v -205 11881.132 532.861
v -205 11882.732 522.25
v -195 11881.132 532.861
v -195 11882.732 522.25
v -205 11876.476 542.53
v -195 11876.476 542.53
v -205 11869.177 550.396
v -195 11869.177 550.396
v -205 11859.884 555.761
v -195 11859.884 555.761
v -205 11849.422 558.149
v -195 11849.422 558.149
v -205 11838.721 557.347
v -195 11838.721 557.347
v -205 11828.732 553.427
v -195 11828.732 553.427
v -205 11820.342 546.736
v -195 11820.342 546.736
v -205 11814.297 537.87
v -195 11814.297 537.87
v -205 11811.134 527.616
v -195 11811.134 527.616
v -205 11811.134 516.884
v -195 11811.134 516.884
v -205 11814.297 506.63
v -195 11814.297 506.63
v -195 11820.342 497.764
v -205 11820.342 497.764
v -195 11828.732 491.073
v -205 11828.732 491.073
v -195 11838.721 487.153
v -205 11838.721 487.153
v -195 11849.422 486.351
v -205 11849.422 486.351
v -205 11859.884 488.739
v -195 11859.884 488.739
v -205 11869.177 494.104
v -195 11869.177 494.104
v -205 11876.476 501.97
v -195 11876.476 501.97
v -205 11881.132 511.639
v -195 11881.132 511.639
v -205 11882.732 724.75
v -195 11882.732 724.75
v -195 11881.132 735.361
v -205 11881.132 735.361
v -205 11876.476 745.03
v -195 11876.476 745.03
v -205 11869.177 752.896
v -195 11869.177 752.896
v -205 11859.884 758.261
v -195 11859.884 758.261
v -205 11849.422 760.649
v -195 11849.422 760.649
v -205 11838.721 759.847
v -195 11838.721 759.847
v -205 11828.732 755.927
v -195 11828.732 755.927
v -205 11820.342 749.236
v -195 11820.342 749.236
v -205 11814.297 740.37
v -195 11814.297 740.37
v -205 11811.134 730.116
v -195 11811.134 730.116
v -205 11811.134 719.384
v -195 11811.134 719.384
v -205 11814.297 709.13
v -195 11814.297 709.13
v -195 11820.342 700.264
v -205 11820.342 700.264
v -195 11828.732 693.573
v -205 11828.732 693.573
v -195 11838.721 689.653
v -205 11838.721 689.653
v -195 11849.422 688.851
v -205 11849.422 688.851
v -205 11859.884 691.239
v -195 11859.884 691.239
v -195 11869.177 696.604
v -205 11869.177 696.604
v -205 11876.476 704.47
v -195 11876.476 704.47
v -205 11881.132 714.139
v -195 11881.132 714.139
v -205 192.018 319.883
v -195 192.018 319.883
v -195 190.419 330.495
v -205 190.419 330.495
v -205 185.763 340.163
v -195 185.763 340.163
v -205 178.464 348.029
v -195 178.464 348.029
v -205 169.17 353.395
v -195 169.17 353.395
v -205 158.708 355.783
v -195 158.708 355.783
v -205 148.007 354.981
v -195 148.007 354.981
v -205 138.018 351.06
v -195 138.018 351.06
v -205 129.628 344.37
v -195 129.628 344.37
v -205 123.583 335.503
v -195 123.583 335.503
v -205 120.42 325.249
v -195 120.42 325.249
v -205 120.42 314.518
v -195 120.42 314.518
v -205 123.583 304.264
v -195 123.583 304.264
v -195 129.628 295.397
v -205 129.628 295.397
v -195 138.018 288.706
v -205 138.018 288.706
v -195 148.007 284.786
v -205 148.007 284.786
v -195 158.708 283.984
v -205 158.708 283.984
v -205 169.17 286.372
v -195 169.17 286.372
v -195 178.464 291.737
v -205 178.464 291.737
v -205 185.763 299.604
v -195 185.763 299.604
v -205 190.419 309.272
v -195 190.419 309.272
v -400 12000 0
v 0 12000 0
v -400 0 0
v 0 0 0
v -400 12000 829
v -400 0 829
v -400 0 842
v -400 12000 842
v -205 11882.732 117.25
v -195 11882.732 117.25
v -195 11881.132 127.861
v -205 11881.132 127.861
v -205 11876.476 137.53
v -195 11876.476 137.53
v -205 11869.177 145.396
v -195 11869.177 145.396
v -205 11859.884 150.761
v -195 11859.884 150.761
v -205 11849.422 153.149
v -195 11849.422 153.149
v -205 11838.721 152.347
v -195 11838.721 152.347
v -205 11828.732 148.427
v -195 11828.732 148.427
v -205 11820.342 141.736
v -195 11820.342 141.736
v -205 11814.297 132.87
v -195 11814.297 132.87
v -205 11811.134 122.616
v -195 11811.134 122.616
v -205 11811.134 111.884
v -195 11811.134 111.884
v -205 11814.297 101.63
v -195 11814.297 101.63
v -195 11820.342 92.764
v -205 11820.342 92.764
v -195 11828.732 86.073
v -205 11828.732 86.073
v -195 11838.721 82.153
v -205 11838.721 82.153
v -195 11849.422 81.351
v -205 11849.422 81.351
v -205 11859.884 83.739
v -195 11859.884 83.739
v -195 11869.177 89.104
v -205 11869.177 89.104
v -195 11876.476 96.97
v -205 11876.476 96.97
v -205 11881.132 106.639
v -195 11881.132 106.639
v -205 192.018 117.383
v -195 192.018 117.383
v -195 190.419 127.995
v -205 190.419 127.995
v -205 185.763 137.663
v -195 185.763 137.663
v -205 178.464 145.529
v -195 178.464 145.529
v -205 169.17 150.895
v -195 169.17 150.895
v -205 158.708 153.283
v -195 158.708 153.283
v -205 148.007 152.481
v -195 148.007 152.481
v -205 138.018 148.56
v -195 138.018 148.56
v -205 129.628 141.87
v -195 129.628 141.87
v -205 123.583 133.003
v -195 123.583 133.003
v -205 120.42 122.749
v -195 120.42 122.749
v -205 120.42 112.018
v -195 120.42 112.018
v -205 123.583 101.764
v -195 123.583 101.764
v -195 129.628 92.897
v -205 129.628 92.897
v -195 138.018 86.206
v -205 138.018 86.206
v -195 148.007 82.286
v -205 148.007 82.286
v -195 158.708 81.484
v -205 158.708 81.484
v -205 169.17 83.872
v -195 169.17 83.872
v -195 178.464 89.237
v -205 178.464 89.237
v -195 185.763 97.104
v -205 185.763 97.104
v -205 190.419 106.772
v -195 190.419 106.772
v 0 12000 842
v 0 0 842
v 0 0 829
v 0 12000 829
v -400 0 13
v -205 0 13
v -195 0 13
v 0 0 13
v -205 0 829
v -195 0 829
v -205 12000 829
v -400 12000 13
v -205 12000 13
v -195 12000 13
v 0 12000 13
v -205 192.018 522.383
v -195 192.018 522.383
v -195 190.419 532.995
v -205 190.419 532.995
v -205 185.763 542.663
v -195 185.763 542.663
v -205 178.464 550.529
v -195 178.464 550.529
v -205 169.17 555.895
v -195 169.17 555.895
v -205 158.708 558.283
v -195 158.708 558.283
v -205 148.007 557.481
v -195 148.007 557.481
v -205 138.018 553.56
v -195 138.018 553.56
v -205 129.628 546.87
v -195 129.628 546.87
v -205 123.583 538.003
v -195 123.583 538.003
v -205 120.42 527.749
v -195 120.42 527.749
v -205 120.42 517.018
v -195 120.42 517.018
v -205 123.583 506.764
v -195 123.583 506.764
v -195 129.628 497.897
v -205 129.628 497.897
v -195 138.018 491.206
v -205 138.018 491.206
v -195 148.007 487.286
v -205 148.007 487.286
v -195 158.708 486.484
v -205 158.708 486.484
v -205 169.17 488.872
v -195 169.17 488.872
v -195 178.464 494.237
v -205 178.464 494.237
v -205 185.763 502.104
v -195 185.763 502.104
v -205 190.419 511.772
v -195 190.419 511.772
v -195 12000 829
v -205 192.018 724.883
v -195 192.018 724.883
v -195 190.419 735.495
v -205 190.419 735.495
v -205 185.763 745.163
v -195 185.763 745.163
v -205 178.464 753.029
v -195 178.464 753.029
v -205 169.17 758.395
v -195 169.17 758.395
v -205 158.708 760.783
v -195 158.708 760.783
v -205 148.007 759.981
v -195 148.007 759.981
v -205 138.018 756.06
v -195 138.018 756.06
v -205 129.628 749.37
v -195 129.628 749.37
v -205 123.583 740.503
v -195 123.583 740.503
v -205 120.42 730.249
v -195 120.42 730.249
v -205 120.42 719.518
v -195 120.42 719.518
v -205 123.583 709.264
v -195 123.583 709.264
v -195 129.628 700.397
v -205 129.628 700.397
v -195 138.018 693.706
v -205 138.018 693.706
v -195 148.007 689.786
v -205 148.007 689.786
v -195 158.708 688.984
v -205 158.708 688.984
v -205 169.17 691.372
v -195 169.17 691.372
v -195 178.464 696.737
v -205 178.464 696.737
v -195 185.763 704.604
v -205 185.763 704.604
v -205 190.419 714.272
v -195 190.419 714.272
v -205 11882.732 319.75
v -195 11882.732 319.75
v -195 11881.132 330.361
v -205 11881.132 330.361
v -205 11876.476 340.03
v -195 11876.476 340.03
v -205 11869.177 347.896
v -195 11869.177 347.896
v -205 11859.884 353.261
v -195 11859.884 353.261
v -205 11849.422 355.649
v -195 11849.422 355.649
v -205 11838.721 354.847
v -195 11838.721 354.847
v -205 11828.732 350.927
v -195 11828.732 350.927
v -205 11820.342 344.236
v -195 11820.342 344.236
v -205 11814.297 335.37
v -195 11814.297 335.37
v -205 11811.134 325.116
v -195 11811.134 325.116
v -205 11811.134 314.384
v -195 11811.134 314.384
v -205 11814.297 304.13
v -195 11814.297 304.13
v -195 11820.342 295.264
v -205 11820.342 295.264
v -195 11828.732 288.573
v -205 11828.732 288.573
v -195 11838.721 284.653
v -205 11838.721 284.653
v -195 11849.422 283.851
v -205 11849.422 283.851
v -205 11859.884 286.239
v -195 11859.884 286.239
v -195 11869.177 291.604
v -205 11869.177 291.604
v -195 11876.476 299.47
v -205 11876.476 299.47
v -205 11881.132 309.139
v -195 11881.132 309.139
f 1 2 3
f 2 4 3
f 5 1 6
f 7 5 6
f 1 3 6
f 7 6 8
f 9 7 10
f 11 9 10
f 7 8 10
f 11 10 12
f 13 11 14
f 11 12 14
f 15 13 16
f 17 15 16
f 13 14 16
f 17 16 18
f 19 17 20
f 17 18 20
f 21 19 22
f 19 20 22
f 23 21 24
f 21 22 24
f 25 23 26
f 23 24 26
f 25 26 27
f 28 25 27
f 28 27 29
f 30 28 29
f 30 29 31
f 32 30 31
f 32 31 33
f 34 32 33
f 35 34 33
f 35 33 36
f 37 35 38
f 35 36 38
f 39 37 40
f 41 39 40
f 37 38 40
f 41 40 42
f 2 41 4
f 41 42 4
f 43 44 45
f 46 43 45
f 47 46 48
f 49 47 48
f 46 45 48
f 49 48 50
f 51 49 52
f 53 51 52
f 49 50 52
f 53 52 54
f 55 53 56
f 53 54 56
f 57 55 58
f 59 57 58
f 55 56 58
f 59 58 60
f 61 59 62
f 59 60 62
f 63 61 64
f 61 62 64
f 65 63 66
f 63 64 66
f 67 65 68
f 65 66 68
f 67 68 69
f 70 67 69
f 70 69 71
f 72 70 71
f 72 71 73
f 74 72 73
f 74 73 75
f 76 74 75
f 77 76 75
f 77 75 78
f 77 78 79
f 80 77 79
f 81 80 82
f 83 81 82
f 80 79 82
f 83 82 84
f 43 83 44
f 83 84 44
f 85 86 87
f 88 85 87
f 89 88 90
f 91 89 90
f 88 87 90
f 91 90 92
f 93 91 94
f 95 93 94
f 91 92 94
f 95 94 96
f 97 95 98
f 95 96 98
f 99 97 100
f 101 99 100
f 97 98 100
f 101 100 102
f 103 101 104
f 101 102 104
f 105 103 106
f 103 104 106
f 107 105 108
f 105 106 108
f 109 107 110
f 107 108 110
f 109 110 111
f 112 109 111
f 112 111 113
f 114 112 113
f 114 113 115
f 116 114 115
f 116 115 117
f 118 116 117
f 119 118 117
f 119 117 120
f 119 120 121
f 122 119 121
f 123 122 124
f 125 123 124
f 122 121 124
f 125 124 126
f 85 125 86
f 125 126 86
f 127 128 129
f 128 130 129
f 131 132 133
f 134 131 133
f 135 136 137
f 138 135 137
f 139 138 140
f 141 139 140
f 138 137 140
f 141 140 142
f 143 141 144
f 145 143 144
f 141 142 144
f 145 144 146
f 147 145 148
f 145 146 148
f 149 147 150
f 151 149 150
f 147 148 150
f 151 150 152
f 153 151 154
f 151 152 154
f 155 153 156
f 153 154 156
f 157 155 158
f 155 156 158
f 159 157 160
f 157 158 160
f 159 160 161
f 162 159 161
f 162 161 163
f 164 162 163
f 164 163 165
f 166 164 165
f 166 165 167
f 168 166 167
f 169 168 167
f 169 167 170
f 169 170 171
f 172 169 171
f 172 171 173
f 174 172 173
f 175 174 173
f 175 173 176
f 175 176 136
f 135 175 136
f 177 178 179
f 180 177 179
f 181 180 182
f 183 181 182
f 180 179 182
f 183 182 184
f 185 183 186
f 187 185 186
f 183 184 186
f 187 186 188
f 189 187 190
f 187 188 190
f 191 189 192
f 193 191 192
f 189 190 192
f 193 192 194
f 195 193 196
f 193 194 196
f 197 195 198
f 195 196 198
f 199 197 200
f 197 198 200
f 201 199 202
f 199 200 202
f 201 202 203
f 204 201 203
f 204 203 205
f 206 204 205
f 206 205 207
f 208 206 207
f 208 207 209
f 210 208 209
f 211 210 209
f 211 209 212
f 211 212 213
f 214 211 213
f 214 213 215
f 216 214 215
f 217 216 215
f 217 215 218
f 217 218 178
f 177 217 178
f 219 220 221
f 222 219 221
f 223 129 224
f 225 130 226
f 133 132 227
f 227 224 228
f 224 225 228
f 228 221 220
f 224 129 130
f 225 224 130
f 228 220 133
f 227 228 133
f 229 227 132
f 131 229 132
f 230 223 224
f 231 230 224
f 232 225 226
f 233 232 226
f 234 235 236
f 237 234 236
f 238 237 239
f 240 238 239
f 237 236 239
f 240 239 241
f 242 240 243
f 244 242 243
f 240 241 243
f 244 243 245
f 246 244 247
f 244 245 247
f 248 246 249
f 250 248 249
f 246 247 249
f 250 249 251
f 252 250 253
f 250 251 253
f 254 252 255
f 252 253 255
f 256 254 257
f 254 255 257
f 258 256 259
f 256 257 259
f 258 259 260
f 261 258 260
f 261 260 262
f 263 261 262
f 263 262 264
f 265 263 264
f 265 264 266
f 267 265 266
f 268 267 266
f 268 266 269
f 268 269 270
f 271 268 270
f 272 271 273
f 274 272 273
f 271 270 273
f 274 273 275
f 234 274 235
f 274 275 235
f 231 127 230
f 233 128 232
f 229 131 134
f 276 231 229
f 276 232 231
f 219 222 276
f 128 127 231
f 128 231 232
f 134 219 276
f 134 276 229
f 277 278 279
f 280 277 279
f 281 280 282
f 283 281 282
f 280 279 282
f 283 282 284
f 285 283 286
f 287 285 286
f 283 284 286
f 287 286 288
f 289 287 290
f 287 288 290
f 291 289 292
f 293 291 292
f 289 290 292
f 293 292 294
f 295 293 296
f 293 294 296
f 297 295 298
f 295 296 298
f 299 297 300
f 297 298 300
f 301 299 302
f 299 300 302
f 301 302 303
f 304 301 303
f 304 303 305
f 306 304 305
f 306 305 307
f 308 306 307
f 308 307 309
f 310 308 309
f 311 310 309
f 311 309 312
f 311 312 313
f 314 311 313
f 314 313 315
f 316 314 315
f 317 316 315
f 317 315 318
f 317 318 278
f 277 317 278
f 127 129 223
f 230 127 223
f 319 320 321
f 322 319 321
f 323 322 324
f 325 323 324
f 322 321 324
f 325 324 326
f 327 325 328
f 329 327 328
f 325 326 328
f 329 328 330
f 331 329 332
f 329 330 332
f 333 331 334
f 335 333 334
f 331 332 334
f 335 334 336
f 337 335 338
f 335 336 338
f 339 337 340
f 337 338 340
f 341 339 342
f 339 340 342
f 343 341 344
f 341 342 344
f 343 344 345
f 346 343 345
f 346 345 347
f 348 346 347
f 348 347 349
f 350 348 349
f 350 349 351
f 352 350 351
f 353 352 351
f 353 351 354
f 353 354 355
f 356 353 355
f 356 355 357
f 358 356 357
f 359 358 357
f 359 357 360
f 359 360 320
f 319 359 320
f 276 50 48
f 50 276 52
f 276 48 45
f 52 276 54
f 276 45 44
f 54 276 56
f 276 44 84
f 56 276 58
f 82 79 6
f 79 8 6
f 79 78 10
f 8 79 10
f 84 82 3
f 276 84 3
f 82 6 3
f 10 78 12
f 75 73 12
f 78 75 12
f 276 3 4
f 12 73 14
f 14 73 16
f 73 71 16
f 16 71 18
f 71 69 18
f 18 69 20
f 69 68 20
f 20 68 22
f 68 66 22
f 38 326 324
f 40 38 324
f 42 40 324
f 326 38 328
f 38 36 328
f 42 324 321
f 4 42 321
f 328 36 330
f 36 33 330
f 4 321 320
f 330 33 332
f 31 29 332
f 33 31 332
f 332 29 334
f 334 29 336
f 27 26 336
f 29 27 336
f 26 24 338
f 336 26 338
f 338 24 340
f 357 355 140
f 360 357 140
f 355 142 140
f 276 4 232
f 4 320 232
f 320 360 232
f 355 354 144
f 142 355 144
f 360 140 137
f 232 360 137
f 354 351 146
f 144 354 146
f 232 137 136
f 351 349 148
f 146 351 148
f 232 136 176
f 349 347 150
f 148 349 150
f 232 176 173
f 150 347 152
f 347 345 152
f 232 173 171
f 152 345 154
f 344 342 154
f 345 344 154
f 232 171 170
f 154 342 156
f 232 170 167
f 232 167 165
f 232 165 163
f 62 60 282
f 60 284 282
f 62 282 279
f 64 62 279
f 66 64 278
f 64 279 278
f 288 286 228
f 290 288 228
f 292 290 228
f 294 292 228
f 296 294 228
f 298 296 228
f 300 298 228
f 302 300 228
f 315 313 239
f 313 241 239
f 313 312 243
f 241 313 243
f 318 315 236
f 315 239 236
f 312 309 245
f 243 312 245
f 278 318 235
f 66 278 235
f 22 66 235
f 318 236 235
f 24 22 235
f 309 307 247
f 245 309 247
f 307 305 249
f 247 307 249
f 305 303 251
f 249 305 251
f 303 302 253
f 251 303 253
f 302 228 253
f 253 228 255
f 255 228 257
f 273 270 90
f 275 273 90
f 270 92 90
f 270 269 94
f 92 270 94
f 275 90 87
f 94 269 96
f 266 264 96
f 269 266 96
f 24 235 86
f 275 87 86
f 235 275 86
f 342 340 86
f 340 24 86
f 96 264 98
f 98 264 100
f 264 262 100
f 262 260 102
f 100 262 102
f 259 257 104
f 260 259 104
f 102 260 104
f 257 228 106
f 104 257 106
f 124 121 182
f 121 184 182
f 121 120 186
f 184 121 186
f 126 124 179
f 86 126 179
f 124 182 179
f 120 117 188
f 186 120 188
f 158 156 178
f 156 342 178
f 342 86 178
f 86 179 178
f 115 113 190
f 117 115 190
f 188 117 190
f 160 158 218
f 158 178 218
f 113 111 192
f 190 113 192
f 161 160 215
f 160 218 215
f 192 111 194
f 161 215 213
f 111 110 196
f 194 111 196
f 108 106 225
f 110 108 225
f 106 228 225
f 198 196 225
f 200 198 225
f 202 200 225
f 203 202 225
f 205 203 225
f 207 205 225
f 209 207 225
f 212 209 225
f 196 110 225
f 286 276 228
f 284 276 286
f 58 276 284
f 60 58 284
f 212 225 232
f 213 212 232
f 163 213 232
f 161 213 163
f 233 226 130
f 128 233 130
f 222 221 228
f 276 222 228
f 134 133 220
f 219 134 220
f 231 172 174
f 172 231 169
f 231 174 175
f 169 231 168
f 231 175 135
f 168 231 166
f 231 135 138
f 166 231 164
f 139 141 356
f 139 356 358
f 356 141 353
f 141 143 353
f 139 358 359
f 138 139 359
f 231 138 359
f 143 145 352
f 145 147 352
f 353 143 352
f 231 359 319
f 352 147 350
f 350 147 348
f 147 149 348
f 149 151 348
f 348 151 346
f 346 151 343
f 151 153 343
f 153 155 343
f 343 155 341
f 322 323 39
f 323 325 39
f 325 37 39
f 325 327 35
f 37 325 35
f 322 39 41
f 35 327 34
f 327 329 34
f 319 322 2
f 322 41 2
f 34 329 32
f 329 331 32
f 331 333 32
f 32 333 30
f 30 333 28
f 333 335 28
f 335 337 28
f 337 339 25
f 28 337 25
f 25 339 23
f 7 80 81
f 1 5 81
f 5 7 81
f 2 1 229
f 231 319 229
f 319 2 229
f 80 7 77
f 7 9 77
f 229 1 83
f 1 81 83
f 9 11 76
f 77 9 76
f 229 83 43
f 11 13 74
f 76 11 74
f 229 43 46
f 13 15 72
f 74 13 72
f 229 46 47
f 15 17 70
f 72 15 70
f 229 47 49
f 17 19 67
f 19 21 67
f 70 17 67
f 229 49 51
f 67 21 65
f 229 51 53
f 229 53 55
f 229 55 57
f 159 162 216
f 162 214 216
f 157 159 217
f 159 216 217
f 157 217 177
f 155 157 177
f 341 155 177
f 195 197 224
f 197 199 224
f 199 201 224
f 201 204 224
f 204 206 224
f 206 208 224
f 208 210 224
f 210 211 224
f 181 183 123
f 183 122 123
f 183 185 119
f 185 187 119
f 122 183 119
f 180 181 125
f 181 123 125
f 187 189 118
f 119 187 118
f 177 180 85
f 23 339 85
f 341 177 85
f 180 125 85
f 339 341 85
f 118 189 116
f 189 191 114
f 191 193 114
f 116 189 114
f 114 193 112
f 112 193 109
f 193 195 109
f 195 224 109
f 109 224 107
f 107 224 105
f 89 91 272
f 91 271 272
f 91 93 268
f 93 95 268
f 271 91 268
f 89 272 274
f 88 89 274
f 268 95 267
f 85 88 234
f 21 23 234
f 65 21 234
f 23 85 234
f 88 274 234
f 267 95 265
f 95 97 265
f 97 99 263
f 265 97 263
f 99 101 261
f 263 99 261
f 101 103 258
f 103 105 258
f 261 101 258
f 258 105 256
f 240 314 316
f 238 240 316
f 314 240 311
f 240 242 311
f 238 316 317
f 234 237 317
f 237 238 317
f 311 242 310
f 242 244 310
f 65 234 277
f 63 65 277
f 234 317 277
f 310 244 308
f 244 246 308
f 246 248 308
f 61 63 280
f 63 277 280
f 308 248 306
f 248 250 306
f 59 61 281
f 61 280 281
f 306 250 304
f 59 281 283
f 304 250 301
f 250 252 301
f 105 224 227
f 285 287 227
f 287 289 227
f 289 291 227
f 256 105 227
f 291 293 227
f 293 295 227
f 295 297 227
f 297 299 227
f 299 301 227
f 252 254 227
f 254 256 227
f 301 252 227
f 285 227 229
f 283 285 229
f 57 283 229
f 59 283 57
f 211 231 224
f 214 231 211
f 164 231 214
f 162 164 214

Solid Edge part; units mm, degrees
sketch "Sketch1" plane through (0, 0, 0) normal (0, -1, 0) x (1, 0, 0)
  line L0 (-195, 829) -> (-195, 13)
  line L1 (-195, 13) -> (0, 13)
  line L2 (0, 13) -> (0, 0)
  line L3 (0, 0) -> (-400, 0)
  line L4 (-400, 0) -> (-400, 13)
  line L5 (-400, 13) -> (-205, 13)
  line L6 (-205, 13) -> (-205, 829)
  line L7 (-205, 829) -> (-400, 829)
  line L8 (-400, 829) -> (-400, 842)
  line L9 (-400, 842) -> (0, 842)
  line L10 (0, 842) -> (0, 829)
  line L11 (0, 829) -> (-195, 829)
extrude "Protrusion1" add sketch "Sketch1" against normal blind 12000
sketch "Sketch2" plane through (-195, 6000, 421) normal (1, 0, 0) x (0, 1, 0)
  circle A0 centre (-5843.9819, 303.8834) radius 36
  circle A1 centre (-5843.9819, 101.3834) radius 36
  circle A2 centre (-5843.9819, -101.1166) radius 36
  circle A3 centre (-5843.9819, -303.6166) radius 36
  dimension "D1" = 101.25
  dimension "D2" = 101.25
extrude "VaciadoExtruido_2" cut sketch "Sketch2" against normal blind 10.1556
sketch "Sketch3" plane through (-195, 6000, 421) normal (1, 0, 0) x (0, 1, 0)
  circle A0 centre (5846.7316, 303.75) radius 36
  circle A1 centre (5846.7316, 101.25) radius 36
  circle A2 centre (5846.7316, -101.25) radius 36
  circle A3 centre (5846.7316, -303.75) radius 36
  dimension "D1" = 101.25
  dimension "D2" = 101.25
extrude "VaciadoExtruido_3" cut sketch "Sketch3" against normal blind 11.2673
